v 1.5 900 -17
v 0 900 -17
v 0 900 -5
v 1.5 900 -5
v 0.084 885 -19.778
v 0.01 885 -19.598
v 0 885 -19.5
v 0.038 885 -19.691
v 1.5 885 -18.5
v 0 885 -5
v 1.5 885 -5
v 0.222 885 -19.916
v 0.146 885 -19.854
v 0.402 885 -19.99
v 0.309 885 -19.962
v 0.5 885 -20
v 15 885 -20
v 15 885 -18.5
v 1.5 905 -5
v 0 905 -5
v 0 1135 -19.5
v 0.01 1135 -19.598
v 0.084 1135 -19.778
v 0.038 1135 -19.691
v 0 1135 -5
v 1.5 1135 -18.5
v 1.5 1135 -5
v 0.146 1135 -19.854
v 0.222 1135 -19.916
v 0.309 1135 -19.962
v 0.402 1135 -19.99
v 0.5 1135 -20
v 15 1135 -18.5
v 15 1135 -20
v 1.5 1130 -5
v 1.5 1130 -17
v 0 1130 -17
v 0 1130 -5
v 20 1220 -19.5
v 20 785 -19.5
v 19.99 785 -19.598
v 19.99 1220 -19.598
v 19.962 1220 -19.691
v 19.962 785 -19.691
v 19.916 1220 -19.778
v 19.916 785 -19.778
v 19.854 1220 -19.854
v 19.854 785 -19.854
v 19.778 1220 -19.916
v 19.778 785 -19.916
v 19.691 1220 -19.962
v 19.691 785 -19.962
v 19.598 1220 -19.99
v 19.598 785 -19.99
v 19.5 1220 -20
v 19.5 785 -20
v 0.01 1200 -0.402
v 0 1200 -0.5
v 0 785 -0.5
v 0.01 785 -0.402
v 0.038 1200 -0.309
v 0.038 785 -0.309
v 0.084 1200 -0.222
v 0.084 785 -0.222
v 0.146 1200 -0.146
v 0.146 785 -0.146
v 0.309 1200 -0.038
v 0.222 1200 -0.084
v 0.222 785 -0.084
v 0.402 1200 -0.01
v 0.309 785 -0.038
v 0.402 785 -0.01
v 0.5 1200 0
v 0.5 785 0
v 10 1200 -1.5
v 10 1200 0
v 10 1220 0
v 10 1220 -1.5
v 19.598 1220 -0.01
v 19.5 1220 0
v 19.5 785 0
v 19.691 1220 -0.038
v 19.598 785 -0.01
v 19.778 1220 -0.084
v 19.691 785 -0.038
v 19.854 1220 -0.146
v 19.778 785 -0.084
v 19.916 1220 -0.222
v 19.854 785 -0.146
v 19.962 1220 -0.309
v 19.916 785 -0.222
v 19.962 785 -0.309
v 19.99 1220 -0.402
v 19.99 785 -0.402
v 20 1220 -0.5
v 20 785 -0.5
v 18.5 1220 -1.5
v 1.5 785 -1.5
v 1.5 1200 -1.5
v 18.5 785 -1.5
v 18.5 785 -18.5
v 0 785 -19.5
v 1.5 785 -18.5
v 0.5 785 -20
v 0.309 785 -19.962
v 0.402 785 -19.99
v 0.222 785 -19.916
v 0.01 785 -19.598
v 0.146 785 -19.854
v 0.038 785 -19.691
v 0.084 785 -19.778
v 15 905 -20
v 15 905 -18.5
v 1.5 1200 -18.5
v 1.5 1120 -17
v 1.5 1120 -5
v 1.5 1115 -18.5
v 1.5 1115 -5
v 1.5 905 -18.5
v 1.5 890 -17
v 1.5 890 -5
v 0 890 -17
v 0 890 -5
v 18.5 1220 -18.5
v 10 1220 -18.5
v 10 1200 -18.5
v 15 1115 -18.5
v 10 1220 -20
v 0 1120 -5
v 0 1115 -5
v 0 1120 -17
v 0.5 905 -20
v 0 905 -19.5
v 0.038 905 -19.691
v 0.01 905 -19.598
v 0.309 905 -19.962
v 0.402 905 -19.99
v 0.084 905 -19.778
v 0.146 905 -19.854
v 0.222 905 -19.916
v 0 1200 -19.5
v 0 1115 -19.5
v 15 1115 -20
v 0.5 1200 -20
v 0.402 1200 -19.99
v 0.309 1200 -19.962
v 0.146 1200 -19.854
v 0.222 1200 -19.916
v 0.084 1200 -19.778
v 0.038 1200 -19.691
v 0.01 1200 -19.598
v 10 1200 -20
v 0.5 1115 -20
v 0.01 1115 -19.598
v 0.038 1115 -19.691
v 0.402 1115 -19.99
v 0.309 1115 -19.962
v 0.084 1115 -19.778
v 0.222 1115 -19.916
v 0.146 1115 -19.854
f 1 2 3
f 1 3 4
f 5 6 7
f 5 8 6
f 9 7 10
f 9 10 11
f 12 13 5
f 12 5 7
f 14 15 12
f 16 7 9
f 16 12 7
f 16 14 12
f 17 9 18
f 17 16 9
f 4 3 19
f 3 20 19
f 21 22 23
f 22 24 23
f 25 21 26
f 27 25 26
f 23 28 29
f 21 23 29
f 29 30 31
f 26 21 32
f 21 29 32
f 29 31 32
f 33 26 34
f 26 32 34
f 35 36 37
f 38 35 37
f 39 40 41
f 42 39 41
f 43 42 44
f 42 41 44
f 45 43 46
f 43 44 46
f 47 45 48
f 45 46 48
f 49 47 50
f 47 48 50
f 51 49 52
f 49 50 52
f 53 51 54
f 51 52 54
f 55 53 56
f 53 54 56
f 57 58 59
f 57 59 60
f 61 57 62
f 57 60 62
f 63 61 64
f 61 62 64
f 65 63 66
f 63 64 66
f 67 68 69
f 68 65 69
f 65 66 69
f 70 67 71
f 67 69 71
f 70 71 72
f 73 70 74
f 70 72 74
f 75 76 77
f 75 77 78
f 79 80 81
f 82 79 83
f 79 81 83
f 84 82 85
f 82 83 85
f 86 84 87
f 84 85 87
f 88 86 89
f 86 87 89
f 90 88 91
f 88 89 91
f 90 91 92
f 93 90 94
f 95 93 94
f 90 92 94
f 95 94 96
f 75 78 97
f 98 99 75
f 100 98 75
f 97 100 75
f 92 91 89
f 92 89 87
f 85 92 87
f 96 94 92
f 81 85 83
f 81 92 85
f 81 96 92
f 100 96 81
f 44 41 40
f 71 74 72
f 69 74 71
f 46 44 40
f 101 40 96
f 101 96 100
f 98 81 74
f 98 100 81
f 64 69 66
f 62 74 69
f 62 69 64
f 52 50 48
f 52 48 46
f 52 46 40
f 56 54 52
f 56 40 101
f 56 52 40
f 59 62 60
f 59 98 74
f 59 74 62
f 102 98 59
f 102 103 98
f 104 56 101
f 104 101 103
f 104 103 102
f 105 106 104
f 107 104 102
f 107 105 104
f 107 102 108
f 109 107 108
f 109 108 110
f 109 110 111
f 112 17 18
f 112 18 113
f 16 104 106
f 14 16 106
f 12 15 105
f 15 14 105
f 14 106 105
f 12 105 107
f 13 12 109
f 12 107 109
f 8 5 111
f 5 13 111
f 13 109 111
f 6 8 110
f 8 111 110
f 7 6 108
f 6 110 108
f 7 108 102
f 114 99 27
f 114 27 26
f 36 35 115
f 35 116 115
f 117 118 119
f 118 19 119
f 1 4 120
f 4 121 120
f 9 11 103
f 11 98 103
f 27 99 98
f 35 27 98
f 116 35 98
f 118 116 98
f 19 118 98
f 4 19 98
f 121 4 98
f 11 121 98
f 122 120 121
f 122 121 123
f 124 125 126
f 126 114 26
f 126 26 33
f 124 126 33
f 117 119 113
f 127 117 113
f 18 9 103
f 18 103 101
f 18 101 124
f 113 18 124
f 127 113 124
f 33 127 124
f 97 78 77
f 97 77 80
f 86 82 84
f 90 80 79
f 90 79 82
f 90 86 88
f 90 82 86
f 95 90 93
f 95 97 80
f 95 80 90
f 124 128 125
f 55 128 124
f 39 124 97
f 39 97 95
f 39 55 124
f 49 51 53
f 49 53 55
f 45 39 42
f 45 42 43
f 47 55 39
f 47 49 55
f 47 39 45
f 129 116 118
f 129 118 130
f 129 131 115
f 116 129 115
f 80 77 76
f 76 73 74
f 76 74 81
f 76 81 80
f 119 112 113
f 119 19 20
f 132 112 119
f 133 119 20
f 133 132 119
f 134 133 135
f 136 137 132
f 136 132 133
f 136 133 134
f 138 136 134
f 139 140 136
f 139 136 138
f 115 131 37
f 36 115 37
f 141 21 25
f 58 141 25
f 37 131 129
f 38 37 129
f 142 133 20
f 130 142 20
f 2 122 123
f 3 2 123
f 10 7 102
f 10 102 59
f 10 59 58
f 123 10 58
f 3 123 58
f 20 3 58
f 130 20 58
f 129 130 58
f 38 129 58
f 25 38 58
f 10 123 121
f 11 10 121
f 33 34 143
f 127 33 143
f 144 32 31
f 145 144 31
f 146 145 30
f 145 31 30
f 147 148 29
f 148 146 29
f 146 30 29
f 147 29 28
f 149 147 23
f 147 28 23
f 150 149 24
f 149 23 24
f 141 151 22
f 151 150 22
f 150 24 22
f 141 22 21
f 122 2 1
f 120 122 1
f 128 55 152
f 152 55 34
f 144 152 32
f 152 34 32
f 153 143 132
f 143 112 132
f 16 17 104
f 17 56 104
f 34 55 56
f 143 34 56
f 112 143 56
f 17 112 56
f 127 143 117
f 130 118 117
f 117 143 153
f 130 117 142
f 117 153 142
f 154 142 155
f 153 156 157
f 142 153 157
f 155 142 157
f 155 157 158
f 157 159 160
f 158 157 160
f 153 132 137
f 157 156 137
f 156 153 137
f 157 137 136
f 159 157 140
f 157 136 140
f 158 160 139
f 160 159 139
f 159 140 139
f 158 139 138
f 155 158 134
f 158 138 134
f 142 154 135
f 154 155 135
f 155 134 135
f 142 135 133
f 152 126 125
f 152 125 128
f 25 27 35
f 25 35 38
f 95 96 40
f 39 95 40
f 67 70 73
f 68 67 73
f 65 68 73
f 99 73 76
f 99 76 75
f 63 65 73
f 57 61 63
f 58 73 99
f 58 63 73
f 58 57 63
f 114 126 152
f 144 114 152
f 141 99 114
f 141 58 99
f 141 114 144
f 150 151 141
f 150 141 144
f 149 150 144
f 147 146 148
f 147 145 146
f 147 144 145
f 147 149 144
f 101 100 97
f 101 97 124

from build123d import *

# Parameters (mm, degrees)
SKETCH1_W                   = 17
SKETCH1_H                   = 17
BOSS_EXTRUDE1_DEPTH         = 1220
CUT_EXTRUDE1_START          = -20
SKETCH2_W                   = 20
SKETCH2_H                   = 20
CUT_EXTRUDE1_DEPTH          = 10
CUT_EXTRUDE2_DEPTH          = 15
SKETCH4_W                   = 3
SKETCH4_H                   = 10
CUT_EXTRUDE3_DEPTH          = 10
SKETCH_PATTERN1_START       = -20
SKETCH_PATTERN1_DEPTH       = 15
SKETCH_PATTERN1_2_OUTLINE_W = 1.5
SKETCH_PATTERN1_2_OUTLINE_H = 10
SKETCH_PATTERN1_2_DEPTH     = 3
SKETCH6_W                   = 20
SKETCH6_H                   = 785
CUT_EXTRUDE4_DEPTH          = 1221.327824808


# Read off the part's stored shape, not the designer's step: Sketch-Pattern1
with BuildPart() as part:
    # Sketch1 → Boss-Extrude1 (new body)
    with BuildSketch(Plane(origin=(0, 0, 0), x_dir=(1, 0, 0), z_dir=(0, 1, 0))):
        with BuildLine():
            Line((0.5, 0), (19.5, 0))
            ThreePointArc((19.5, 0), (19.853553391, 0.146446609), (20, 0.5))
            Line((20, 0.5), (20, 19.5))
            ThreePointArc((20, 19.5), (19.853553391, 19.853553391), (19.5, 20))
            Line((19.5, 20), (0.5, 20))
            ThreePointArc((0.5, 20), (0.146446609, 19.853553391), (0, 19.5))
            Line((0, 19.5), (0, 0.5))
            ThreePointArc((0, 0.5), (0.146446609, 0.146446609), (0.5, 0))
        make_face()
        with Locations((10, 10)):
            Rectangle(SKETCH1_W, SKETCH1_H, mode=Mode.SUBTRACT)
    extrude(amount=BOSS_EXTRUDE1_DEPTH)

    # Sketch2 → Cut-Extrude1 (cut)
    with BuildSketch(Plane(origin=(20, 0, 0), x_dir=(0, 0, -1), z_dir=(1, 0, 0)).offset(CUT_EXTRUDE1_START)):
        with Locations((10, 1210)):
            Rectangle(SKETCH2_W, SKETCH2_H)
        with Locations((10, 10)):
            Rectangle(SKETCH2_W, SKETCH2_H)
    extrude(amount=CUT_EXTRUDE1_DEPTH, mode=Mode.SUBTRACT)

    # Sketch3 → Cut-Extrude2 (cut)
    with BuildSketch(Plane(origin=(0, 0, -20), x_dir=(-1, 0, 0), z_dir=(0, 0, -1))):
        Polygon((-15, 1115), (0, 1115), (0, 1120), (-9, 1120), (-9, 1130), (0, 1130), (0, 1135), (-15, 1135), align=None)
    extrude(amount=-CUT_EXTRUDE2_DEPTH, mode=Mode.SUBTRACT)

    # Sketch4 → Cut-Extrude3 (cut)
    with BuildSketch(Plane.ZY):
        with Locations((-18.5, 1125)):
            Rectangle(SKETCH4_W, SKETCH4_H)
    extrude(amount=-CUT_EXTRUDE3_DEPTH, mode=Mode.SUBTRACT)

    # Sketch-Pattern1 outline → Sketch-Pattern1 (cut)
    with BuildSketch(Plane.XY.offset(SKETCH_PATTERN1_START)):
        Polygon((15, 85), (15, 105), (0, 105), (0, 100), (1.5, 100), (1.5, 90), (0, 90), (0, 85), align=None)
        Polygon((1.5, 330), (1.5, 320), (0, 320), (0, 315), (15, 315), (15, 335), (0, 335), (0, 330), align=None)
        Polygon((1.5, 500), (1.5, 490), (0, 490), (0, 485), (15, 485), (15, 505), (0, 505), (0, 500), align=None)
        Polygon((1.5, 730), (1.5, 720), (0, 720), (0, 715), (15, 715), (15, 735), (0, 735), (0, 730), align=None)
        Polygon((1.5, 900), (1.5, 890), (0, 890), (0, 885), (15, 885), (15, 905), (0, 905), (0, 900), align=None)
    extrude(amount=SKETCH_PATTERN1_DEPTH, mode=Mode.SUBTRACT)

    # Sketch-Pattern1 2 outline → Sketch-Pattern1 2 (cut)
    with BuildSketch(Plane.XY.offset(SKETCH_PATTERN1_START)):
        with Locations((0.75, 95)):
            Rectangle(SKETCH_PATTERN1_2_OUTLINE_W, SKETCH_PATTERN1_2_OUTLINE_H)
        with Locations((0.75, 325)):
            Rectangle(SKETCH_PATTERN1_2_OUTLINE_W, SKETCH_PATTERN1_2_OUTLINE_H)
        with Locations((0.75, 495)):
            Rectangle(SKETCH_PATTERN1_2_OUTLINE_W, SKETCH_PATTERN1_2_OUTLINE_H)
        with Locations((0.75, 725)):
            Rectangle(SKETCH_PATTERN1_2_OUTLINE_W, SKETCH_PATTERN1_2_OUTLINE_H)
        with Locations((0.75, 895)):
            Rectangle(SKETCH_PATTERN1_2_OUTLINE_W, SKETCH_PATTERN1_2_OUTLINE_H)
    extrude(amount=SKETCH_PATTERN1_2_DEPTH, mode=Mode.SUBTRACT)

    # Sketch6 → Cut-Extrude4 (cut, through all)
    with BuildSketch(Plane(origin=(0, 0, -20), x_dir=(-1, 0, 0), z_dir=(0, 0, -1))):
        with Locations((-10, 392.5)):
            Rectangle(SKETCH6_W, SKETCH6_H)
    extrude(amount=-CUT_EXTRUDE4_DEPTH, mode=Mode.SUBTRACT)


solid = part.part
